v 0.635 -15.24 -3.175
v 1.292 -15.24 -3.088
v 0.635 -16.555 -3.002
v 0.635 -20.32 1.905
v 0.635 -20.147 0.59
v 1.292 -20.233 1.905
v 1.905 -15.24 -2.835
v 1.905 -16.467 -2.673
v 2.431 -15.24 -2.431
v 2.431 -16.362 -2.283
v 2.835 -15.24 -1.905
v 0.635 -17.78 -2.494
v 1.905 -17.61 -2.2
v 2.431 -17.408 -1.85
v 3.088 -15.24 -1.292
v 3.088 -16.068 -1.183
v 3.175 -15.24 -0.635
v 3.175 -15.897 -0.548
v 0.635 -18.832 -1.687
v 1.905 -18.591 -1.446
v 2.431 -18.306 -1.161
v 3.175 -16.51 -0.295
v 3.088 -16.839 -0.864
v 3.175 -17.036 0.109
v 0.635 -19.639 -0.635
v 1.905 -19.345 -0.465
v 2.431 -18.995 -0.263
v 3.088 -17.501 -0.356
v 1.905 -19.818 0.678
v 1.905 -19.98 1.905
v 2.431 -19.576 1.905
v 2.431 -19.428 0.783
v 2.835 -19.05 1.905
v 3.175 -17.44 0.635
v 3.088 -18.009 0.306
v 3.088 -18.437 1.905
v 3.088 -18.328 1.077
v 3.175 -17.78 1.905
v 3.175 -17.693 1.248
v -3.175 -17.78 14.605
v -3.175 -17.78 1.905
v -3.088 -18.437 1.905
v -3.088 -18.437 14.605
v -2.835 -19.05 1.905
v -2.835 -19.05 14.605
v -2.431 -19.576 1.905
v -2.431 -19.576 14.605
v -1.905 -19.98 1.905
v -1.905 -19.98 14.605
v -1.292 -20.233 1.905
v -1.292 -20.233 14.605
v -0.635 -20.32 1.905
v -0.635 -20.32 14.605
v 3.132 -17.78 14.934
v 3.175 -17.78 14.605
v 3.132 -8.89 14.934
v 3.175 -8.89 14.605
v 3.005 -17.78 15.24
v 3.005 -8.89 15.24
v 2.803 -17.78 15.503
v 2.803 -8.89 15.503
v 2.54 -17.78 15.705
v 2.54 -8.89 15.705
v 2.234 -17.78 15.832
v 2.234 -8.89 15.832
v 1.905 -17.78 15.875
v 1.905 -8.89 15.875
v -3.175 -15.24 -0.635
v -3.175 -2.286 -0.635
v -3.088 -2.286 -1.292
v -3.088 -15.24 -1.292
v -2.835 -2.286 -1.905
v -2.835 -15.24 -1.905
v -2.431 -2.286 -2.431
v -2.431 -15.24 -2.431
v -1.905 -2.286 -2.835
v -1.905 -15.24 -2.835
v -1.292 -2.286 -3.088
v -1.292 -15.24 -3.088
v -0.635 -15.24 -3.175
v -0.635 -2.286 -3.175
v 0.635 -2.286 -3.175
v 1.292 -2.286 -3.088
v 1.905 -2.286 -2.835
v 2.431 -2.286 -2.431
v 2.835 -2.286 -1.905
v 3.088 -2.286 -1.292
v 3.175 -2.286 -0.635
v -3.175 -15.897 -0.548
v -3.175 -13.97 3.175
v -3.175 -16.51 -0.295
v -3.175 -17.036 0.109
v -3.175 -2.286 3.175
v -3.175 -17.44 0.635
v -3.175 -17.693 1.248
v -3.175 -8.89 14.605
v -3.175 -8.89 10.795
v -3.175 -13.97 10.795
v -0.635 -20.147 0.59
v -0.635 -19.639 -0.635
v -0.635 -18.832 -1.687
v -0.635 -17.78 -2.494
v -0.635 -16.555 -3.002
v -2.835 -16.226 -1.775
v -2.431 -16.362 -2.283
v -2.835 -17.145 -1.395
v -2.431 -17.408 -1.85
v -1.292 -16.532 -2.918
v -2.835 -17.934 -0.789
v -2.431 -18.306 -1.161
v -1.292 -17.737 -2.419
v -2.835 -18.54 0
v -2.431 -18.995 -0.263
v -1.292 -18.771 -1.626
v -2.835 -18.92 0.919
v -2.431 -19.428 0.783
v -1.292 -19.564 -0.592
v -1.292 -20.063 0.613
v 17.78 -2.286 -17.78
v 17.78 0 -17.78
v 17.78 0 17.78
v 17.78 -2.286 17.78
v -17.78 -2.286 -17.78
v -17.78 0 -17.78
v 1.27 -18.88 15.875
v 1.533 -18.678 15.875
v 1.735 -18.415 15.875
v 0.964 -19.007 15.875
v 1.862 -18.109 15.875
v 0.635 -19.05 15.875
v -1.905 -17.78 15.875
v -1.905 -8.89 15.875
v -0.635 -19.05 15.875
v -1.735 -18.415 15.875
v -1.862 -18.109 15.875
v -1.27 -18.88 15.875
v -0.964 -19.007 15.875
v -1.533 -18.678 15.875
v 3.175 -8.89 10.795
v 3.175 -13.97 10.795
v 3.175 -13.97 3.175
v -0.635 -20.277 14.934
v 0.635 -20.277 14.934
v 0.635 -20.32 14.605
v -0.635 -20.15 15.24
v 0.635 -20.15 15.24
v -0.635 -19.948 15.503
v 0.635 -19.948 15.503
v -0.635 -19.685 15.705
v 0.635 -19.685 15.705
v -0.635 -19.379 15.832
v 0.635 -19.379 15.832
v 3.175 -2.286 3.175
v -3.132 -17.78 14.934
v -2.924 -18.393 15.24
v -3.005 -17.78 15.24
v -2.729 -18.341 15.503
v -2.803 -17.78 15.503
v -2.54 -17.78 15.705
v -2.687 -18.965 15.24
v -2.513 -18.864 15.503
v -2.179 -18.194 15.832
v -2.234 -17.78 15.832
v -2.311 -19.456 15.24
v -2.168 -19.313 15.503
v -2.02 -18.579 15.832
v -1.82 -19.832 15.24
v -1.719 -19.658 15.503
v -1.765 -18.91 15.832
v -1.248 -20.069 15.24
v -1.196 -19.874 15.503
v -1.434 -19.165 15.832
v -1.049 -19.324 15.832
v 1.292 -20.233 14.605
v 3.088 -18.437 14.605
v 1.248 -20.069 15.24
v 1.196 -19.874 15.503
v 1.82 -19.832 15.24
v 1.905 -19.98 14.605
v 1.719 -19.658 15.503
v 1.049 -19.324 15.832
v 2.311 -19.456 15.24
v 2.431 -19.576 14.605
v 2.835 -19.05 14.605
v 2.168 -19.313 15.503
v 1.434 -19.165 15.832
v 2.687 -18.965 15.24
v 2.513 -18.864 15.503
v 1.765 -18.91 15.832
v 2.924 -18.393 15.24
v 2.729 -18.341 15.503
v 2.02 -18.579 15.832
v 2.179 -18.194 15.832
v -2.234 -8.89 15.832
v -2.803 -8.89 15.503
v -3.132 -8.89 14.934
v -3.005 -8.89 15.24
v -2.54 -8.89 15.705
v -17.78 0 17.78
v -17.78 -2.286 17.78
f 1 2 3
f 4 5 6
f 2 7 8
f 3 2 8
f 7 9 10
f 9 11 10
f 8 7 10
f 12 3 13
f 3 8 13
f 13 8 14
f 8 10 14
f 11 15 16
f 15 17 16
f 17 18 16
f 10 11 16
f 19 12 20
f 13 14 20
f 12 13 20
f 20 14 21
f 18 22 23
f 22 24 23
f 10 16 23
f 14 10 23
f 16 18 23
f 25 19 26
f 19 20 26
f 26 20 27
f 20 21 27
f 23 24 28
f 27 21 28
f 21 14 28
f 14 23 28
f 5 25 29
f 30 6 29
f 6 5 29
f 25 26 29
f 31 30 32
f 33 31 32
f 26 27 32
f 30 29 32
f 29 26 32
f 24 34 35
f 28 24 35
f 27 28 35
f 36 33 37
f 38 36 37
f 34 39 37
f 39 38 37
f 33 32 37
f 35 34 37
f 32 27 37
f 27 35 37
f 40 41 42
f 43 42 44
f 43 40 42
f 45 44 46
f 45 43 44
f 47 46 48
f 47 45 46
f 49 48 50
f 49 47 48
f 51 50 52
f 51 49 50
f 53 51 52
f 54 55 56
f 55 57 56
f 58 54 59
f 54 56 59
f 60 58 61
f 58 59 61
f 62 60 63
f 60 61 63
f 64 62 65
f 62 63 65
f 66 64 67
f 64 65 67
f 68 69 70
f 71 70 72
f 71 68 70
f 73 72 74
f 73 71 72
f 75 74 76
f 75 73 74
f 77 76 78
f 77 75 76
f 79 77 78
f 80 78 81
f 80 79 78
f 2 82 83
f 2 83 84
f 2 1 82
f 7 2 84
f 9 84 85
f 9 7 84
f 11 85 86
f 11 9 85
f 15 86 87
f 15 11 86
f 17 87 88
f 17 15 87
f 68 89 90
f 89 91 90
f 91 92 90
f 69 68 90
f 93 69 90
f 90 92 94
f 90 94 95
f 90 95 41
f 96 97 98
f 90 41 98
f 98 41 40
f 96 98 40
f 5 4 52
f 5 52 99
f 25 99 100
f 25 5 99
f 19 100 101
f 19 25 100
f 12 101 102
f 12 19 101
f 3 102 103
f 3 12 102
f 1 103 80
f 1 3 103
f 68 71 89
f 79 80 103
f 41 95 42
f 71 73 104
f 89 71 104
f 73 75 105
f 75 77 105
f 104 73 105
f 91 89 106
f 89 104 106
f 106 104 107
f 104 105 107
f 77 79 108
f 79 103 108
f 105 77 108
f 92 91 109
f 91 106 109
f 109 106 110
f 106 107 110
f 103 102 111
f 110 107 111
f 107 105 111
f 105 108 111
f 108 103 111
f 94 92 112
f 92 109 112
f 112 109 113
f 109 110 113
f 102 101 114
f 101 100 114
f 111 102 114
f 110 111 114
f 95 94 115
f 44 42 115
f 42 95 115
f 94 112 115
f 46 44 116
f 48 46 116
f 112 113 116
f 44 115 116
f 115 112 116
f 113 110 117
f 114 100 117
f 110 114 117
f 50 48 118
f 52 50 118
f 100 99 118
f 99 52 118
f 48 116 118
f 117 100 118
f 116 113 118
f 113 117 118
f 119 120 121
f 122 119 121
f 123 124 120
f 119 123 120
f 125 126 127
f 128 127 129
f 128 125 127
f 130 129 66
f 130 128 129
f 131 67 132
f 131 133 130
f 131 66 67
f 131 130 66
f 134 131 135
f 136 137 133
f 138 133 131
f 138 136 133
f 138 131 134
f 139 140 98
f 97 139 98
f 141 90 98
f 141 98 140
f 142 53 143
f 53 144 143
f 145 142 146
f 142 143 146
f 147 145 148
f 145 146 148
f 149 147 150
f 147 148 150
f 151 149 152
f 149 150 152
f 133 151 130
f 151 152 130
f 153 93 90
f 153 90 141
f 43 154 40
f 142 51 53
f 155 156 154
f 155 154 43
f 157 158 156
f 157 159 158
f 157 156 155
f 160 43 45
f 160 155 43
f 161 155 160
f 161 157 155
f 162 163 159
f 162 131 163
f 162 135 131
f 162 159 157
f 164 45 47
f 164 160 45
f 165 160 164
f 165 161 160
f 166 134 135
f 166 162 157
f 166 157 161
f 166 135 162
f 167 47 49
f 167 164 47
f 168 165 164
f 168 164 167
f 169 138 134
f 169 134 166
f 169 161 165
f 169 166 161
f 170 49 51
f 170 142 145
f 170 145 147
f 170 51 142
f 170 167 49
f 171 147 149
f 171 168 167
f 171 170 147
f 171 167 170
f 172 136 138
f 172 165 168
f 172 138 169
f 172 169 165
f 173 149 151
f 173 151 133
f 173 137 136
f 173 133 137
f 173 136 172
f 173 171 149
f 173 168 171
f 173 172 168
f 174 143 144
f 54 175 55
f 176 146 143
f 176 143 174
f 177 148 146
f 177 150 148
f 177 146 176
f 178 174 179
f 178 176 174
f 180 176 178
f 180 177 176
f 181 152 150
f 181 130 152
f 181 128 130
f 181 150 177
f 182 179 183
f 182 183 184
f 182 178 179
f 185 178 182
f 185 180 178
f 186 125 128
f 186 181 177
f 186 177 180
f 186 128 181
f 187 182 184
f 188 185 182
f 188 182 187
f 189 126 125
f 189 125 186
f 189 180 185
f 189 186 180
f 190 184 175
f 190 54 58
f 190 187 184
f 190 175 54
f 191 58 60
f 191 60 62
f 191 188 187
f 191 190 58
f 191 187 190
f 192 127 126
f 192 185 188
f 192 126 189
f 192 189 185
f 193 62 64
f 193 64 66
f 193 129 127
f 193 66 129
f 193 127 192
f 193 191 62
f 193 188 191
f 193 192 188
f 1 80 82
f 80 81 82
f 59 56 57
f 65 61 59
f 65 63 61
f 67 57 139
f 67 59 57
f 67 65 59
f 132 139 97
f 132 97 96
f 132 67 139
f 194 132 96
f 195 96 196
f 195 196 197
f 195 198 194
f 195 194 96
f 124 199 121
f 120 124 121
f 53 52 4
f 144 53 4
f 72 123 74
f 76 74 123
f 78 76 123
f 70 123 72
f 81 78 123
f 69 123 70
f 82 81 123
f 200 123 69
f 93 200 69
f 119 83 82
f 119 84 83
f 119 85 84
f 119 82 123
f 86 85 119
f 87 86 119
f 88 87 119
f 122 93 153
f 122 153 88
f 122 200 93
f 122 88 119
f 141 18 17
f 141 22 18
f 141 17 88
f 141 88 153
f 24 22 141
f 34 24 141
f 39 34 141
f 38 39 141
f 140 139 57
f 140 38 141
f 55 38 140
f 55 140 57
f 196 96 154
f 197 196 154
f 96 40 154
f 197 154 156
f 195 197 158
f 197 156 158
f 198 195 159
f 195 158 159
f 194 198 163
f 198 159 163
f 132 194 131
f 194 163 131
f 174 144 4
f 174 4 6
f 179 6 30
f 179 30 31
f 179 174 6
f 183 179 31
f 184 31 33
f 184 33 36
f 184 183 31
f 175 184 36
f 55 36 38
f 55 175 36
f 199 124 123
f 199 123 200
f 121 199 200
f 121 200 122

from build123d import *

# Parameters (mm, degrees)
F0_W     = 35.56
F0_H     = 35.56
F0_W_2   = 6.35
F0_H_2   = 6.35
F1_DEPTH = 2.286
F2_DEPTH = 20.32
F3_W     = 6.35
F3_H     = 6.35
F4_DEPTH = 12.7
F5_R     = 5.08
F6_R     = 2.54
F7_W     = 6.35
F7_H     = 5.08
F8_DEPTH = 5.08
F9_R     = 1.27


with BuildPart() as f1:
    # F0 (on Front) → F1 (new body)
    with BuildSketch(Plane.XZ):
        Rectangle(F0_W, F0_H)
        Rectangle(F0_W_2, F0_H_2, mode=Mode.SUBTRACT)
    extrude(amount=F1_DEPTH)

    # F0 (on Front) → F2 (join)
    with BuildSketch(Plane.XZ):
        Rectangle(F0_W_2, F0_H_2)
    extrude(amount=F2_DEPTH)

    # F3 (on face) → F4 (join)
    with BuildSketch(Plane.XY.offset(3.175)):
        with Locations((0, -17.145)):
            Rectangle(F3_W, F3_H)
    extrude(amount=F4_DEPTH)

    # F5
    f5_edges = [f1.edges().sort_by_distance(p)[0] for p in [
        (0, -20.32, -3.175),
    ]]
    fillet(f5_edges, radius=F5_R)

    # F6
    f6_edges = [f1.edges().sort_by_distance(p)[0] for p in [
        (3.175, -20.32, 8.89),
        (-3.175, -20.32, 8.89),
    ]]
    fillet(f6_edges, radius=F6_R)

    # F7 (on face) → F8 (join)
    with BuildSketch(Plane(origin=(0, -13.97, 0), x_dir=(-1, 0, 0), z_dir=(0, 1, 0))):
        with Locations((0, 13.335)):
            Rectangle(F7_W, F7_H)
    extrude(amount=F8_DEPTH)

    # F9
    f9_edges = [f1.edges().sort_by_distance(p)[0] for p in [
        (2.431051, -19.576051, 15.875),
        (0, -20.32, 15.875),
        (-2.431051, -19.576051, 15.875),
    ]]
    fillet(f9_edges, radius=F9_R)


solid = f1.part
